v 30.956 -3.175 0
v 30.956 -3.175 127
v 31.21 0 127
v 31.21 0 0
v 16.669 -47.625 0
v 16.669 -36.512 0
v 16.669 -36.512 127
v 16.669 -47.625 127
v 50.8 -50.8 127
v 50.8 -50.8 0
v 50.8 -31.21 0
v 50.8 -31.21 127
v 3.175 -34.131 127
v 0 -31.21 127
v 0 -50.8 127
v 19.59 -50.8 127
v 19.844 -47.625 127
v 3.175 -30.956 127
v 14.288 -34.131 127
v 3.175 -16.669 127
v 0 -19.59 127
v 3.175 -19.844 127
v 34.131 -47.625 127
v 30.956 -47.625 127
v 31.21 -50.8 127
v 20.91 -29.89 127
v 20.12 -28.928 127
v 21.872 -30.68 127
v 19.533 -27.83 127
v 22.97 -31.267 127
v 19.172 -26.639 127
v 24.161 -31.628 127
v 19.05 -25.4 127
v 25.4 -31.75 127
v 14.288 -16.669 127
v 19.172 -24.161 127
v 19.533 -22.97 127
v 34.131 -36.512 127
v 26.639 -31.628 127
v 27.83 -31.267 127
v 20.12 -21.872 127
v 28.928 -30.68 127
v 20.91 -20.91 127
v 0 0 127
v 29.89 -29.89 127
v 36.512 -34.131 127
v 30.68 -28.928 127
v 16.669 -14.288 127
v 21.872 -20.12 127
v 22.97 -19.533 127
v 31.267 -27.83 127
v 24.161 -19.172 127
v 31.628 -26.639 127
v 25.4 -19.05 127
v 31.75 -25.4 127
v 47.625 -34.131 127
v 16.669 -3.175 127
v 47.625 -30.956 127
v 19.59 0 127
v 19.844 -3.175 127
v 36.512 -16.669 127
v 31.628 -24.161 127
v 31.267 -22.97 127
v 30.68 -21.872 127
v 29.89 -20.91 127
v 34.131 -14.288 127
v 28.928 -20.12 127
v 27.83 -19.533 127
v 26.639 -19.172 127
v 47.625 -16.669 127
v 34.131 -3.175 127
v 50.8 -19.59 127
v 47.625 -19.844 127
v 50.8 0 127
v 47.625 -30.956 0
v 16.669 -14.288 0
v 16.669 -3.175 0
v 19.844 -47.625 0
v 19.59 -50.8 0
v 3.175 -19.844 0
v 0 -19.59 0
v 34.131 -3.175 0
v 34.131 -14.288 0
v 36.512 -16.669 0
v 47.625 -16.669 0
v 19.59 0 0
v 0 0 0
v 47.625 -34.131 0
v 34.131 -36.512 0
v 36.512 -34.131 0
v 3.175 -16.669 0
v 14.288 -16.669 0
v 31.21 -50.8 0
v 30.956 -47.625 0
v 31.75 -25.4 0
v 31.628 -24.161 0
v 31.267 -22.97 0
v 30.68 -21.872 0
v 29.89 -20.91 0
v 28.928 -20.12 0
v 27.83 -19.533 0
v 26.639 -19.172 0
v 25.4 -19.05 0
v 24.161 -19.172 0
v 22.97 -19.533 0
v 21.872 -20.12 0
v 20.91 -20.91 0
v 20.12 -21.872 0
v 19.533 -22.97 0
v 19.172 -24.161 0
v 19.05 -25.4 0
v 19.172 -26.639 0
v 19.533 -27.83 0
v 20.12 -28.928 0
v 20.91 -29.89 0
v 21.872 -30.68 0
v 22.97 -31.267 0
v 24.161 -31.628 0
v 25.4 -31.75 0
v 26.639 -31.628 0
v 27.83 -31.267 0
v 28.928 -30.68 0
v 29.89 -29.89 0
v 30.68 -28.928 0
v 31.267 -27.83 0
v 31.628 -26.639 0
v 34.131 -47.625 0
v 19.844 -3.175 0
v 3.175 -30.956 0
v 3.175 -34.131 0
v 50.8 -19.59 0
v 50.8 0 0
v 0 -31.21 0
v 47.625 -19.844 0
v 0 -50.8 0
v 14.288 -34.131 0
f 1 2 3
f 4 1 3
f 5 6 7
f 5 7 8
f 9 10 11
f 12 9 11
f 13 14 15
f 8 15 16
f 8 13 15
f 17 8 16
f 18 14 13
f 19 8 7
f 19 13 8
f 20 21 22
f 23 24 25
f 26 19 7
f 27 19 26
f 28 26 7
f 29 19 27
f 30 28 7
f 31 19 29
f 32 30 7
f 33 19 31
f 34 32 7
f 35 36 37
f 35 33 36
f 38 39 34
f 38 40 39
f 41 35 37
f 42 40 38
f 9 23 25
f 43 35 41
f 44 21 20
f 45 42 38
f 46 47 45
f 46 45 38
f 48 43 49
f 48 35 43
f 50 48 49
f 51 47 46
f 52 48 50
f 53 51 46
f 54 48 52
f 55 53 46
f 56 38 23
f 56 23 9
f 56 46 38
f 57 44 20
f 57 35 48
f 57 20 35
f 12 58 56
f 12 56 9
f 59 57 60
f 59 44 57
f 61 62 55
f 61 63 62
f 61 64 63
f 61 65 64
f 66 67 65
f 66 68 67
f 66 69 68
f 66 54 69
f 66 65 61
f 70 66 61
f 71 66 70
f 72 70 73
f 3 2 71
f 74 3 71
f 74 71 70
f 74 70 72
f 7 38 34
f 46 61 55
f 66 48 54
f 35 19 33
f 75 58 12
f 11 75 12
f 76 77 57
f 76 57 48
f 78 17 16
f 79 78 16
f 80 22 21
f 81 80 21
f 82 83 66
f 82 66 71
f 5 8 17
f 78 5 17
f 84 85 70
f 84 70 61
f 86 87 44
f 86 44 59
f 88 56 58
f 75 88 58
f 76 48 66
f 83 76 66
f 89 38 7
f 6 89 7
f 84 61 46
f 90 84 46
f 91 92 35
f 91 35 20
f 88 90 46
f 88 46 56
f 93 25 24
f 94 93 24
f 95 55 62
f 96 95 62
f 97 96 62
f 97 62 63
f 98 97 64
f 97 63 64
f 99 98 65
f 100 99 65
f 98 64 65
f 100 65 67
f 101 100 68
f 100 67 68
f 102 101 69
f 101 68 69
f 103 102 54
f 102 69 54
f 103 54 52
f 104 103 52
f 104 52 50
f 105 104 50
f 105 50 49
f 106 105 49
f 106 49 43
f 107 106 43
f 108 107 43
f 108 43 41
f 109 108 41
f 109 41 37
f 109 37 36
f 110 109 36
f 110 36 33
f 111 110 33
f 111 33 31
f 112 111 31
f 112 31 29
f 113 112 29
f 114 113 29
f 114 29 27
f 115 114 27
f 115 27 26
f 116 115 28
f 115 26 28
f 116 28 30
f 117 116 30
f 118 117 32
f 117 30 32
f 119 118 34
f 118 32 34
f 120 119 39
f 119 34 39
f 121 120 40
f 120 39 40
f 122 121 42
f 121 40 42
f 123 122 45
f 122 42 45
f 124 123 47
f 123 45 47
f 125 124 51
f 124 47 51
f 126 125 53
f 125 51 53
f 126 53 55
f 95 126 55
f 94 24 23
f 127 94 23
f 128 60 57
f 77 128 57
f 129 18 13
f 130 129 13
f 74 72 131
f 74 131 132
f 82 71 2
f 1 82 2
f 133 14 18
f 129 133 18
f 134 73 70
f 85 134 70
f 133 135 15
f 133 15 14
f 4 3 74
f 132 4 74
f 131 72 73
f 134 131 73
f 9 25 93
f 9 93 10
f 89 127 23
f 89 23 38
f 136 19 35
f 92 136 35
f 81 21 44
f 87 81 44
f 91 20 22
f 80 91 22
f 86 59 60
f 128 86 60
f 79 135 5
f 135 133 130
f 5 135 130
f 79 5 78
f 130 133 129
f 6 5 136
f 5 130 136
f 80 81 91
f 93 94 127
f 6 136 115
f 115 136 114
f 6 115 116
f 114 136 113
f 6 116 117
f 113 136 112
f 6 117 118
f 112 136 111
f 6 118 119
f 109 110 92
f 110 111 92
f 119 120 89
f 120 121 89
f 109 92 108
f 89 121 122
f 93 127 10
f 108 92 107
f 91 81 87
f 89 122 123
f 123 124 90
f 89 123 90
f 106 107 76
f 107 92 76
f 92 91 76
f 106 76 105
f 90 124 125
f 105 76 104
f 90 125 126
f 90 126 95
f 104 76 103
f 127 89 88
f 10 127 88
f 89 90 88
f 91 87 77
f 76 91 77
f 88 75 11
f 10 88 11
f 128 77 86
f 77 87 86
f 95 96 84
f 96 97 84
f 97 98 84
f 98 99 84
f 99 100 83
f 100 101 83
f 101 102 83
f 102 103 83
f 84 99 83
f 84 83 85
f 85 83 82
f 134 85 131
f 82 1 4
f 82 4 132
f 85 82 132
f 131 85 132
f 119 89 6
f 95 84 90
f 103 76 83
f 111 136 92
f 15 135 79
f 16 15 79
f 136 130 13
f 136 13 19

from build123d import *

# Parameters (mm, degrees)
F0_W     = 50.8
F0_H     = 50.8
F1_DEPTH = 127
F2_R     = 6.35
F3_DEPTH = 177.8


with BuildPart() as f1:
    # F0 (on Top) → F1 (new body)
    with BuildSketch(Plane.XY):
        with Locations((25.4, -25.4)):
            Rectangle(F0_W, F0_H)
    extrude(amount=F1_DEPTH)

    # F2 (on face) → F3 (cut)
    with BuildSketch(Plane.XY.offset(127)):
        with Locations((25.4, -25.4)):
            Circle(F2_R)
        Polygon((19.84375, -47.625), (19.58975, -50.8), (31.21025, -50.8), (30.95625, -47.625), (34.13125, -47.625), (34.13125, -36.5125), (16.66875, -36.5125), (16.66875, -47.625), align=None)
        Polygon((50.8, -31.21025), (50.8, -19.58975), (47.625, -19.84375), (47.625, -16.66875), (36.5125, -16.66875), (36.5125, -34.13125), (47.625, -34.13125), (47.625, -30.95625), align=None)
        Polygon((3.175, -19.84375), (0, -19.58975), (0, -31.21025), (3.175, -30.95625), (3.175, -34.13125), (14.2875, -34.13125), (14.2875, -16.66875), (3.175, -16.66875), align=None)
        Polygon((19.84375, -3.175), (16.66875, -3.175), (16.66875, -14.2875), (34.13125, -14.2875), (34.13125, -3.175), (30.95625, -3.175), (31.21025, 0), (19.58975, 0), align=None)
    extrude(amount=-F3_DEPTH, mode=Mode.SUBTRACT)


solid = f1.part
